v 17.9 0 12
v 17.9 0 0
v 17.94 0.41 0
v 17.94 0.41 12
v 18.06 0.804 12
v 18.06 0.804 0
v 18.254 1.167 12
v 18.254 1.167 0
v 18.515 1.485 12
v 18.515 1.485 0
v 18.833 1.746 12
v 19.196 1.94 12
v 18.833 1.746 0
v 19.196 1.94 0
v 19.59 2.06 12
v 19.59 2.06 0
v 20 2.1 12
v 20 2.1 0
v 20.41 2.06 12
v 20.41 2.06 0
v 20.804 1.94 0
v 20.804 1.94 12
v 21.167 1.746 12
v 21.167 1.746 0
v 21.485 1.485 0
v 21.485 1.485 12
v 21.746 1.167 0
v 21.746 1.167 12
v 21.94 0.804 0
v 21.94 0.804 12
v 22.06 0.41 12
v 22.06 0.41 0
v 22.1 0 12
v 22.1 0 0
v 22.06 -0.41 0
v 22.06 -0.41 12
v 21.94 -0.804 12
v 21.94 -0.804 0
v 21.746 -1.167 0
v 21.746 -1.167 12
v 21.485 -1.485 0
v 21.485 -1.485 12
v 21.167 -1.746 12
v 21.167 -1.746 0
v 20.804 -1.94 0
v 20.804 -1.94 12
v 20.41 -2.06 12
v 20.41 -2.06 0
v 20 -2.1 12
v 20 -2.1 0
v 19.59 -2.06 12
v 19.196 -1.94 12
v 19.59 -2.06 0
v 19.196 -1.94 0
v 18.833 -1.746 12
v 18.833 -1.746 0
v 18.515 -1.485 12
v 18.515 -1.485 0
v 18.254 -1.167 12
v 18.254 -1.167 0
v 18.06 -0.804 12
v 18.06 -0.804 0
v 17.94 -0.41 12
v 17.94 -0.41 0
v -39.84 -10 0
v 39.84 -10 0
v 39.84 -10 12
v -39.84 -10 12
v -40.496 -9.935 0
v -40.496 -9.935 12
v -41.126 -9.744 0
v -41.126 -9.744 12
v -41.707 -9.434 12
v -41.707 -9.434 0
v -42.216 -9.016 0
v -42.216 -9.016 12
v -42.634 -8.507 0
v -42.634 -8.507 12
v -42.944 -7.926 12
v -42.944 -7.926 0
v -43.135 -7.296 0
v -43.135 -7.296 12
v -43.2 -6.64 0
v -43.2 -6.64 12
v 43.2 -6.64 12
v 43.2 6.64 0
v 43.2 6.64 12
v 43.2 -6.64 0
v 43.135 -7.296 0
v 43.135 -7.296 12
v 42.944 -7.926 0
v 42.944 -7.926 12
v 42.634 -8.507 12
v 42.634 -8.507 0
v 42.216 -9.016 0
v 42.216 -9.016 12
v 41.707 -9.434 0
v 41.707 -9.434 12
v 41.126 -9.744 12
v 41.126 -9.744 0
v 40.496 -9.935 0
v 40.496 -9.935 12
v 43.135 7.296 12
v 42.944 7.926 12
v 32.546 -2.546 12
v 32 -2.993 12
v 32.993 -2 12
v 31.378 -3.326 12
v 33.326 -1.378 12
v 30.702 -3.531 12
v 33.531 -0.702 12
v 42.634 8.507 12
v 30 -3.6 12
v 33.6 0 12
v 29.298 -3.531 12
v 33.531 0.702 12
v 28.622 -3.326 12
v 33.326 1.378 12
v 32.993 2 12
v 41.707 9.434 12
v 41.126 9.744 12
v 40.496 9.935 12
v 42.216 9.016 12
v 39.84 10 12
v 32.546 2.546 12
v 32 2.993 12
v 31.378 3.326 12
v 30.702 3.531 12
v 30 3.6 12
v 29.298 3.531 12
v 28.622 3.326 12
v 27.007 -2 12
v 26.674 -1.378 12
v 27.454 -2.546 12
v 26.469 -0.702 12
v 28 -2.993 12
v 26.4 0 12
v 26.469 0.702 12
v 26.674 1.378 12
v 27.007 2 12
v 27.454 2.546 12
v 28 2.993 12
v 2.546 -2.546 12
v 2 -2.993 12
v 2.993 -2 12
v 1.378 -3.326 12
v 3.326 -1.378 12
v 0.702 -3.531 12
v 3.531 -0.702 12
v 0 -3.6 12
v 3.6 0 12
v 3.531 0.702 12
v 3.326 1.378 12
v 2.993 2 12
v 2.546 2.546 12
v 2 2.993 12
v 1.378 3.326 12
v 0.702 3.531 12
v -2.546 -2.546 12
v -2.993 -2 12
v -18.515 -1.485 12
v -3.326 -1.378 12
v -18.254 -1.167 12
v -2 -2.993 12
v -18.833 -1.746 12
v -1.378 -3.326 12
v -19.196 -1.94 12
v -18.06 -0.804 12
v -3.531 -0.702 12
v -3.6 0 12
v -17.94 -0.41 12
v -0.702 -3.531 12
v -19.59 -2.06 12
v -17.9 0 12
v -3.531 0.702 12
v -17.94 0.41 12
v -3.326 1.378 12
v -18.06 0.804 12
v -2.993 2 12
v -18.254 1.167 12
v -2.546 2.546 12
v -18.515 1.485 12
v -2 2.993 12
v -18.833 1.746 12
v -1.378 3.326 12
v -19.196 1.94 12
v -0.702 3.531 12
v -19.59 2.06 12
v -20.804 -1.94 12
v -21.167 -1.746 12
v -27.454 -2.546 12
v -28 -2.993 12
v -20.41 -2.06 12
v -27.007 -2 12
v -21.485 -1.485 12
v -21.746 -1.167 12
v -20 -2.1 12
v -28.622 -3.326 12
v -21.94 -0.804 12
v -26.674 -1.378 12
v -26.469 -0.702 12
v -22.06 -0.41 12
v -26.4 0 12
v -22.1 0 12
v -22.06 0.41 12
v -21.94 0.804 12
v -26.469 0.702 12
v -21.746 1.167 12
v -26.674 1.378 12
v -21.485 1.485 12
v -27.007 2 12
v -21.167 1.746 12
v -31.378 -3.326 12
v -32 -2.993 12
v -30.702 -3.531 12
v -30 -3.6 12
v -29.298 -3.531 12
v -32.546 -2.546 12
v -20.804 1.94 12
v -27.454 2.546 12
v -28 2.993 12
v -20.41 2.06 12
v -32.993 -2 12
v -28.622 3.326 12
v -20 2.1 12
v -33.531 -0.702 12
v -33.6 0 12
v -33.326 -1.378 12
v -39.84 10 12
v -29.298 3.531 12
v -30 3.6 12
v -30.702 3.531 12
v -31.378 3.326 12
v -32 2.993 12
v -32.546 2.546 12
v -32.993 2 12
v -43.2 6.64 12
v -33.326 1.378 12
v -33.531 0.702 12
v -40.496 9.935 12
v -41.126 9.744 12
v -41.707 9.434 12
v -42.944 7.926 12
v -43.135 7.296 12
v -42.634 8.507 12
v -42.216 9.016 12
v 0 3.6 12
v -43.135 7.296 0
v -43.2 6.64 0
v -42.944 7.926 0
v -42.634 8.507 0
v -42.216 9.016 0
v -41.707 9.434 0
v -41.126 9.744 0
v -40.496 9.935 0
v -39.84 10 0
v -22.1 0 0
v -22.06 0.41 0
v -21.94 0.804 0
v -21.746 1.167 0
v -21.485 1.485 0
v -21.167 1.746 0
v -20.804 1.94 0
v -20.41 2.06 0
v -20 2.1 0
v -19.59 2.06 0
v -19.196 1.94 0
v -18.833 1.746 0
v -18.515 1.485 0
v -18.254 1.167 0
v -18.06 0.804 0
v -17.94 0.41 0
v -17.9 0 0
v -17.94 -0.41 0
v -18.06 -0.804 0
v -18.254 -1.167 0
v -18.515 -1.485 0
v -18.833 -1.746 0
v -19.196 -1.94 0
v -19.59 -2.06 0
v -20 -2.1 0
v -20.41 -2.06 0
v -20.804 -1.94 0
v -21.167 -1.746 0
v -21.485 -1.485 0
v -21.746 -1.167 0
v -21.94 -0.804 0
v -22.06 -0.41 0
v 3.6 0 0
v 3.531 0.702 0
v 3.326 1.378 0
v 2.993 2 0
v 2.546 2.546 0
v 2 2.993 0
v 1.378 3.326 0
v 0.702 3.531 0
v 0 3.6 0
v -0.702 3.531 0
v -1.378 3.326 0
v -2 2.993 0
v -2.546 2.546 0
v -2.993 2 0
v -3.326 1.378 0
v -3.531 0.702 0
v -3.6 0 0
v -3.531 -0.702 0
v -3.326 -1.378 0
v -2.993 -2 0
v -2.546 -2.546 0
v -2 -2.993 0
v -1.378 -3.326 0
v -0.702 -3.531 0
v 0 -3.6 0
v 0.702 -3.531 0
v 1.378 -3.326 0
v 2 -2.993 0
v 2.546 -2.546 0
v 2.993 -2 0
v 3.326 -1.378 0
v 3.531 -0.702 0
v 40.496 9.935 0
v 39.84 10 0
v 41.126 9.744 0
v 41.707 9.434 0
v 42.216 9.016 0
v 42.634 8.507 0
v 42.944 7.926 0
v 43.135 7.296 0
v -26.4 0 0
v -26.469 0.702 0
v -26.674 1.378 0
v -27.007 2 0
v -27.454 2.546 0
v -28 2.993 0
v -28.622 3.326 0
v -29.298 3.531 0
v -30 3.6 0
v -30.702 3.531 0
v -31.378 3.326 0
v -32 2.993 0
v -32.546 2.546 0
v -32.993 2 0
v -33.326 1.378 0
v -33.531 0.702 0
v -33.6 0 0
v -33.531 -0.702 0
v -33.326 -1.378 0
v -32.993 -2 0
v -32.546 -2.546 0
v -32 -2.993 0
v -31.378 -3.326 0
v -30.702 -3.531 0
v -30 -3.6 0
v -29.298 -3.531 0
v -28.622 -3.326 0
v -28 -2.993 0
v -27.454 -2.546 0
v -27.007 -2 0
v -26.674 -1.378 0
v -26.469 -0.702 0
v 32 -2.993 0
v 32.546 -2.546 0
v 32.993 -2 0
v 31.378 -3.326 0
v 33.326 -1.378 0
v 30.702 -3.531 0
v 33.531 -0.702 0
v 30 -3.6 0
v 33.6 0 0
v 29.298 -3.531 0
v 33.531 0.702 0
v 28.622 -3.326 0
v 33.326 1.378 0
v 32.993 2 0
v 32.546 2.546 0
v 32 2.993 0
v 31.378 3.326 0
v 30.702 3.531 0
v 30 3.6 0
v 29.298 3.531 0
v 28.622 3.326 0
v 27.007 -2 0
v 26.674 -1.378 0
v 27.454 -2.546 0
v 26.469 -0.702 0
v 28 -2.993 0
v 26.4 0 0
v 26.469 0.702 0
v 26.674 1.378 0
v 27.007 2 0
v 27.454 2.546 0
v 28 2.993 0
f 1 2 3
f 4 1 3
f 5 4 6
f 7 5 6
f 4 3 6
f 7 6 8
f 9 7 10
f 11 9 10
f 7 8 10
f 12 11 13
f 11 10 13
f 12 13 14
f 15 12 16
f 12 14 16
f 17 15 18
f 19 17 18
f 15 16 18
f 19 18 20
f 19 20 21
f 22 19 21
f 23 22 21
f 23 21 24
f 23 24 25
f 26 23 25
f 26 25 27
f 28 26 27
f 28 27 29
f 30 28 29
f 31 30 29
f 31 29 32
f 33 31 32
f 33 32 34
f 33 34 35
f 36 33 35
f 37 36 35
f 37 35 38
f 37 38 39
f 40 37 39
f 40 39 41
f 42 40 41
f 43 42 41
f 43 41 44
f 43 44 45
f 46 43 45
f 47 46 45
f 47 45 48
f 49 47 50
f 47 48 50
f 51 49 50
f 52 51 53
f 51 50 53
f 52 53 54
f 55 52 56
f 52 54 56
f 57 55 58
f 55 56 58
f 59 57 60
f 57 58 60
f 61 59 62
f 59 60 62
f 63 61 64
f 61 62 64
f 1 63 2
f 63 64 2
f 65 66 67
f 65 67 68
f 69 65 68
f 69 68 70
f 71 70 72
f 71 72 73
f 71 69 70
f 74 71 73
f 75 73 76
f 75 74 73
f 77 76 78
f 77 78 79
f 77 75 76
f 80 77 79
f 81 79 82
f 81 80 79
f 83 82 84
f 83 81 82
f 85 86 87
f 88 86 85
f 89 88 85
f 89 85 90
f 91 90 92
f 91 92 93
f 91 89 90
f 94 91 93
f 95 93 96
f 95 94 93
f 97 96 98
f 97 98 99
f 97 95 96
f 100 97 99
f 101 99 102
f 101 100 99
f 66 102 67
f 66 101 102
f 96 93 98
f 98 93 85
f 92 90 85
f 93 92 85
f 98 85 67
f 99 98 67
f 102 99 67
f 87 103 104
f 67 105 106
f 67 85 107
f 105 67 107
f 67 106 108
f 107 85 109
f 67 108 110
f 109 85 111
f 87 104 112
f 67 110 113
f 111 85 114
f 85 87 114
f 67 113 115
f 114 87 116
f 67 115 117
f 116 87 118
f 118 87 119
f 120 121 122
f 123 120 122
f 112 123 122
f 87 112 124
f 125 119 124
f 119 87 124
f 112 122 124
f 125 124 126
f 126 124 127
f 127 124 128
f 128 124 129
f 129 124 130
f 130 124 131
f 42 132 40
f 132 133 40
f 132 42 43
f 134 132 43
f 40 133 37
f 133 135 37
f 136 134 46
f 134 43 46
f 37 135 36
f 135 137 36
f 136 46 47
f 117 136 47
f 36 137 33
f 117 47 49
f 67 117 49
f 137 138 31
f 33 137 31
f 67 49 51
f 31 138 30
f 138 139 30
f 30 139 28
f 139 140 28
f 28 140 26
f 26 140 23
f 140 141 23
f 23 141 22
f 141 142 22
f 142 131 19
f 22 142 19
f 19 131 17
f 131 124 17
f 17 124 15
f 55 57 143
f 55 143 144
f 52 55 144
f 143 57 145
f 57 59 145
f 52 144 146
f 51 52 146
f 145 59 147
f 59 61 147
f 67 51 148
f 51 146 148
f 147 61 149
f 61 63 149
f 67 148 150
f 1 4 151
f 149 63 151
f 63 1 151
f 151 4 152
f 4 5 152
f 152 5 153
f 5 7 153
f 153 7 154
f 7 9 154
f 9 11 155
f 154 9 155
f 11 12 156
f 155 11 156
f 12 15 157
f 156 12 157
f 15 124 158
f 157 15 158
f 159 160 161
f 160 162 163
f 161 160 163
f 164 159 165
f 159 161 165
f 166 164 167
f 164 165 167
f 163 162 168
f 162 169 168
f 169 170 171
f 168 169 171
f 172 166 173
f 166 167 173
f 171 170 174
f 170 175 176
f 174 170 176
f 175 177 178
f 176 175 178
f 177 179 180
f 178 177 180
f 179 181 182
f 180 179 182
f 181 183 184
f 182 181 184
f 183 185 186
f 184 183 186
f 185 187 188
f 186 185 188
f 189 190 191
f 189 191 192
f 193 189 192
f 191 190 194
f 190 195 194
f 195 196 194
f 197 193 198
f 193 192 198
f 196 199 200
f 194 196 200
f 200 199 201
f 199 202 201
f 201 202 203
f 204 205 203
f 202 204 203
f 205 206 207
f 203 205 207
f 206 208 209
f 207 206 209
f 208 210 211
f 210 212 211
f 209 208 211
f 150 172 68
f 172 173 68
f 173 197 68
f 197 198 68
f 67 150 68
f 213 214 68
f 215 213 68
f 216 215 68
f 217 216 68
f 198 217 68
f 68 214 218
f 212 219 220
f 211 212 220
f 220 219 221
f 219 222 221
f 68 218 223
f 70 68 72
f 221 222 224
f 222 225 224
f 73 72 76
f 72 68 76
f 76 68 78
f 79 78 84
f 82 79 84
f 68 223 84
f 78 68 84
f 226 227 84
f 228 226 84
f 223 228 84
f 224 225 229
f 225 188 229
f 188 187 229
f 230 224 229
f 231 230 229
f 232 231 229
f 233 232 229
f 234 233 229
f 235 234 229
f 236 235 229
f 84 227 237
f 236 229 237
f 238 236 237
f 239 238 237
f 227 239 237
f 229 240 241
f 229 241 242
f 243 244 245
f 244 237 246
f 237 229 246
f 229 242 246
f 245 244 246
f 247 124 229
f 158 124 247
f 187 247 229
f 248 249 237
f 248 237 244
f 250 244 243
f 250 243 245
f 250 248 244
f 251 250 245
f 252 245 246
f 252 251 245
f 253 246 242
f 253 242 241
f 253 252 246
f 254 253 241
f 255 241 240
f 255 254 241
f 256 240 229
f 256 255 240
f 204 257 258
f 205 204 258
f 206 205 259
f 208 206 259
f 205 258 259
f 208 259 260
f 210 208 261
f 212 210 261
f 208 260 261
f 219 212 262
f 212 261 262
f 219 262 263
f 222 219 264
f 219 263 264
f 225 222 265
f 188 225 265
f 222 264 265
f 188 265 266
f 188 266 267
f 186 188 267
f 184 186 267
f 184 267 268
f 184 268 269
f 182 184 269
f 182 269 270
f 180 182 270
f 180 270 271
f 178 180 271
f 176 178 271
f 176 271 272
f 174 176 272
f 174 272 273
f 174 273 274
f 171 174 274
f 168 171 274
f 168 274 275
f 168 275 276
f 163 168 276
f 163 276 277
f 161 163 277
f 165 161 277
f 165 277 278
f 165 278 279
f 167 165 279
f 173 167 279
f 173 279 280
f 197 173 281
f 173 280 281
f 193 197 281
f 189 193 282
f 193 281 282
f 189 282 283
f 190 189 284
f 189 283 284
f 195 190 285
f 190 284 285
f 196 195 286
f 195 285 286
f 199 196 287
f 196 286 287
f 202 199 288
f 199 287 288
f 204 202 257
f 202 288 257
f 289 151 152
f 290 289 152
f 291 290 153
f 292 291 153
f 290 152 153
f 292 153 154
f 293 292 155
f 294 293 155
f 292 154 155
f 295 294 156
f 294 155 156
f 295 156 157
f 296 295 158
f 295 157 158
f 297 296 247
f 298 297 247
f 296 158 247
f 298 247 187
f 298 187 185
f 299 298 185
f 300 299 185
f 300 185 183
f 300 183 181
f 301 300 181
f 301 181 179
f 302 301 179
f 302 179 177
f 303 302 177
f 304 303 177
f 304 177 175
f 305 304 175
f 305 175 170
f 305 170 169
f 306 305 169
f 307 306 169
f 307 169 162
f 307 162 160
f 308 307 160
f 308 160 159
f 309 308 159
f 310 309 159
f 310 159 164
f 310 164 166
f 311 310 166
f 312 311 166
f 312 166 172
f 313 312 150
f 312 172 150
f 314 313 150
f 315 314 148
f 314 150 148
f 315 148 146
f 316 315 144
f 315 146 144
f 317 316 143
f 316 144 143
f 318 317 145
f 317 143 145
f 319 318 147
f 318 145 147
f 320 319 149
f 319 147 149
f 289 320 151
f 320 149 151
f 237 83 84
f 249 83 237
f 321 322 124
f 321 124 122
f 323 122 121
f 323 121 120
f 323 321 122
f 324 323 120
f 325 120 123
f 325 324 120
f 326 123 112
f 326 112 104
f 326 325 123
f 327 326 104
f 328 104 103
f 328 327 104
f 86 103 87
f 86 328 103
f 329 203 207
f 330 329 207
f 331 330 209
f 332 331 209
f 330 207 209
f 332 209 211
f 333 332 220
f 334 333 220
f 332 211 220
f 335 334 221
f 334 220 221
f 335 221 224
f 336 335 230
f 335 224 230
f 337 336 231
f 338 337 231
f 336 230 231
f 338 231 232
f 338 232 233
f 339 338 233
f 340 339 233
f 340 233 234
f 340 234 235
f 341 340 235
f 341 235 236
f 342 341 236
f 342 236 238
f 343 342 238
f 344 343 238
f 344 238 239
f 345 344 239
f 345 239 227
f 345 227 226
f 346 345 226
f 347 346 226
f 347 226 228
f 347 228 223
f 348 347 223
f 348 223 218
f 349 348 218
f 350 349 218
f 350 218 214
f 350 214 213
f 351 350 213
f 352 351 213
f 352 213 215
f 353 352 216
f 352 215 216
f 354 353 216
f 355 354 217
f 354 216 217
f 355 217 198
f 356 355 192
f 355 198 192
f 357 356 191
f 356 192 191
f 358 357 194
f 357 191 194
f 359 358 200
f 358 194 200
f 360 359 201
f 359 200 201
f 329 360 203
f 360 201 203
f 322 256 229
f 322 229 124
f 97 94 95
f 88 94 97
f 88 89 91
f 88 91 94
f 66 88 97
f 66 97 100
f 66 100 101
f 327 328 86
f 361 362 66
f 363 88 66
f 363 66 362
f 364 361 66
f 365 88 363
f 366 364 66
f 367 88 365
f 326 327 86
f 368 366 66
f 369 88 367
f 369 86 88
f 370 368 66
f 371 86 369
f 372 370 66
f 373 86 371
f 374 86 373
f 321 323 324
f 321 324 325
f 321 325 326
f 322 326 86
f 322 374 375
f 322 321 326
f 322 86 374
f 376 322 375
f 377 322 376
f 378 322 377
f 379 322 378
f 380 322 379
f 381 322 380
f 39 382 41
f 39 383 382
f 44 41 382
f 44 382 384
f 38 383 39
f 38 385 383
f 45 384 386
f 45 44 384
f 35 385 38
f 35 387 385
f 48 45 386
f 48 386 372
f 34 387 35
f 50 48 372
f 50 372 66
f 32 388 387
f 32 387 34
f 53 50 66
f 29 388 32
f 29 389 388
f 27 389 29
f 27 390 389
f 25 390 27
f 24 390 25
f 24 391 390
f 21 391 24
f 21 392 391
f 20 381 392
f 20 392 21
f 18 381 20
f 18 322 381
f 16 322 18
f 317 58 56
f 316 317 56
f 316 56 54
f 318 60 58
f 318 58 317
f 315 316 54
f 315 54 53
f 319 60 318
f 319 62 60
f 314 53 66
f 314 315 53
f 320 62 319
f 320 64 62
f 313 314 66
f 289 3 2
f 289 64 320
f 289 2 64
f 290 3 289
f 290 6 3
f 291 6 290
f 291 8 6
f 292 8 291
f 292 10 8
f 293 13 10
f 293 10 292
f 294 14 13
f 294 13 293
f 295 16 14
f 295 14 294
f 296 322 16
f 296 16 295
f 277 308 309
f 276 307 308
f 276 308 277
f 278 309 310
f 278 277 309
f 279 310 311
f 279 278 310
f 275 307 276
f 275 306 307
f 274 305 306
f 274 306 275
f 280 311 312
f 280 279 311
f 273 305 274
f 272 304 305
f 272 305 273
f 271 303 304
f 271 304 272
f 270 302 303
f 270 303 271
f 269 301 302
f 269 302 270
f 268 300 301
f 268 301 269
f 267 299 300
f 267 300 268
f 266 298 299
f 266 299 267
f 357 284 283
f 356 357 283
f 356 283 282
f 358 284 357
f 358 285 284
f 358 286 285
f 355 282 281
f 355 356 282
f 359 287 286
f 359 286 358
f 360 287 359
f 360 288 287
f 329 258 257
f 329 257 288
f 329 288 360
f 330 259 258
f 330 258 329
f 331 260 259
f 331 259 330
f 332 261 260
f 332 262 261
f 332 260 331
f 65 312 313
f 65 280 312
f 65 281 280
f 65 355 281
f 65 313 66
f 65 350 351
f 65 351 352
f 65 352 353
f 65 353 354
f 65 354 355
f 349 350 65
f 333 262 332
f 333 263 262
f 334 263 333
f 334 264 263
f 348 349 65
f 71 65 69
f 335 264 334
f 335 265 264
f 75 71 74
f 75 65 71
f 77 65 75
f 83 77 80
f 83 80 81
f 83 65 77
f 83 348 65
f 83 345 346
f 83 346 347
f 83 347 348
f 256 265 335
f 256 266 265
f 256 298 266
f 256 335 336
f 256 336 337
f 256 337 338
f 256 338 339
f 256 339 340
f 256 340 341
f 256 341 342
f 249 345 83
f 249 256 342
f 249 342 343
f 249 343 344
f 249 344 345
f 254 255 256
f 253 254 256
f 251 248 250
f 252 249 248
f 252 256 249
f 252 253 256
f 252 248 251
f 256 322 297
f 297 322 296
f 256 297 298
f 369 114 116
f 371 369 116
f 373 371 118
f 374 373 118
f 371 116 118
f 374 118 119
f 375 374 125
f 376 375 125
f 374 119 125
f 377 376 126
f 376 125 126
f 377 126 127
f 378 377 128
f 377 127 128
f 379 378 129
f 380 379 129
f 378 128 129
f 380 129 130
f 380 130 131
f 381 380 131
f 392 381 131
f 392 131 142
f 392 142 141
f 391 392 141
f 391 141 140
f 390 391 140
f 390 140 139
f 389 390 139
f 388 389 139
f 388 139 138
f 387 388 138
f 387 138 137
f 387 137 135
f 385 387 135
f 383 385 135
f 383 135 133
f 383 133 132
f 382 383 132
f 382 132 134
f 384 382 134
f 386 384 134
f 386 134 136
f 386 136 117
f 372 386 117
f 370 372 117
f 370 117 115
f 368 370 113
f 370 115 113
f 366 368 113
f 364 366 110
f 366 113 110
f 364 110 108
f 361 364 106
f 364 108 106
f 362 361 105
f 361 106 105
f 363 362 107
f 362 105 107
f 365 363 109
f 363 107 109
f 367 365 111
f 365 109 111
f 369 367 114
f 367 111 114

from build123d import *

# Parameters (mm, degrees)
BOSS_EXTRUDE1_DEPTH   = 12
SKETCH3_R             = 3.6
CUT_EXTRUDE2_DEPTH    = 13
M5X0_8_TAPPED_HOLE1_D = 4.2


with BuildPart() as part:
    # Sketch1 → Boss-Extrude1 (new body)
    with BuildSketch(Plane.XY):
        with BuildLine():
            Line((39.84, -10), (-39.84, -10))
            ThreePointArc((-39.84, -10), (-42.215878785, -9.015878785), (-43.2, -6.64))
            Line((-43.2, -6.64), (-43.2, 6.64))
            ThreePointArc((-43.2, 6.64), (-42.215878785, 9.015878785), (-39.84, 10))
            Line((-39.84, 10), (39.84, 10))
            ThreePointArc((39.84, 10), (42.215878785, 9.015878785), (43.2, 6.64))
            Line((43.2, 6.64), (43.2, -6.64))
            ThreePointArc((43.2, -6.64), (42.215878785, -9.015878785), (39.84, -10))
        make_face()
    extrude(amount=BOSS_EXTRUDE1_DEPTH)

    # Sketch3 → Cut-Extrude2 (cut, through all)
    with BuildSketch(Plane.XY.offset(12)):
        with Locations((-30, 0)):
            Circle(SKETCH3_R)
        with Locations((30, 0)):
            Circle(SKETCH3_R)
        Circle(SKETCH3_R)
    extrude(amount=-CUT_EXTRUDE2_DEPTH, mode=Mode.SUBTRACT)

    # M5x0.8 Tapped Hole1 (through all)
    with Locations(Plane.XY.offset(12)):
        with Locations((-20, 0), (20, 0)):
            Hole(M5X0_8_TAPPED_HOLE1_D / 2)


solid = part.part
